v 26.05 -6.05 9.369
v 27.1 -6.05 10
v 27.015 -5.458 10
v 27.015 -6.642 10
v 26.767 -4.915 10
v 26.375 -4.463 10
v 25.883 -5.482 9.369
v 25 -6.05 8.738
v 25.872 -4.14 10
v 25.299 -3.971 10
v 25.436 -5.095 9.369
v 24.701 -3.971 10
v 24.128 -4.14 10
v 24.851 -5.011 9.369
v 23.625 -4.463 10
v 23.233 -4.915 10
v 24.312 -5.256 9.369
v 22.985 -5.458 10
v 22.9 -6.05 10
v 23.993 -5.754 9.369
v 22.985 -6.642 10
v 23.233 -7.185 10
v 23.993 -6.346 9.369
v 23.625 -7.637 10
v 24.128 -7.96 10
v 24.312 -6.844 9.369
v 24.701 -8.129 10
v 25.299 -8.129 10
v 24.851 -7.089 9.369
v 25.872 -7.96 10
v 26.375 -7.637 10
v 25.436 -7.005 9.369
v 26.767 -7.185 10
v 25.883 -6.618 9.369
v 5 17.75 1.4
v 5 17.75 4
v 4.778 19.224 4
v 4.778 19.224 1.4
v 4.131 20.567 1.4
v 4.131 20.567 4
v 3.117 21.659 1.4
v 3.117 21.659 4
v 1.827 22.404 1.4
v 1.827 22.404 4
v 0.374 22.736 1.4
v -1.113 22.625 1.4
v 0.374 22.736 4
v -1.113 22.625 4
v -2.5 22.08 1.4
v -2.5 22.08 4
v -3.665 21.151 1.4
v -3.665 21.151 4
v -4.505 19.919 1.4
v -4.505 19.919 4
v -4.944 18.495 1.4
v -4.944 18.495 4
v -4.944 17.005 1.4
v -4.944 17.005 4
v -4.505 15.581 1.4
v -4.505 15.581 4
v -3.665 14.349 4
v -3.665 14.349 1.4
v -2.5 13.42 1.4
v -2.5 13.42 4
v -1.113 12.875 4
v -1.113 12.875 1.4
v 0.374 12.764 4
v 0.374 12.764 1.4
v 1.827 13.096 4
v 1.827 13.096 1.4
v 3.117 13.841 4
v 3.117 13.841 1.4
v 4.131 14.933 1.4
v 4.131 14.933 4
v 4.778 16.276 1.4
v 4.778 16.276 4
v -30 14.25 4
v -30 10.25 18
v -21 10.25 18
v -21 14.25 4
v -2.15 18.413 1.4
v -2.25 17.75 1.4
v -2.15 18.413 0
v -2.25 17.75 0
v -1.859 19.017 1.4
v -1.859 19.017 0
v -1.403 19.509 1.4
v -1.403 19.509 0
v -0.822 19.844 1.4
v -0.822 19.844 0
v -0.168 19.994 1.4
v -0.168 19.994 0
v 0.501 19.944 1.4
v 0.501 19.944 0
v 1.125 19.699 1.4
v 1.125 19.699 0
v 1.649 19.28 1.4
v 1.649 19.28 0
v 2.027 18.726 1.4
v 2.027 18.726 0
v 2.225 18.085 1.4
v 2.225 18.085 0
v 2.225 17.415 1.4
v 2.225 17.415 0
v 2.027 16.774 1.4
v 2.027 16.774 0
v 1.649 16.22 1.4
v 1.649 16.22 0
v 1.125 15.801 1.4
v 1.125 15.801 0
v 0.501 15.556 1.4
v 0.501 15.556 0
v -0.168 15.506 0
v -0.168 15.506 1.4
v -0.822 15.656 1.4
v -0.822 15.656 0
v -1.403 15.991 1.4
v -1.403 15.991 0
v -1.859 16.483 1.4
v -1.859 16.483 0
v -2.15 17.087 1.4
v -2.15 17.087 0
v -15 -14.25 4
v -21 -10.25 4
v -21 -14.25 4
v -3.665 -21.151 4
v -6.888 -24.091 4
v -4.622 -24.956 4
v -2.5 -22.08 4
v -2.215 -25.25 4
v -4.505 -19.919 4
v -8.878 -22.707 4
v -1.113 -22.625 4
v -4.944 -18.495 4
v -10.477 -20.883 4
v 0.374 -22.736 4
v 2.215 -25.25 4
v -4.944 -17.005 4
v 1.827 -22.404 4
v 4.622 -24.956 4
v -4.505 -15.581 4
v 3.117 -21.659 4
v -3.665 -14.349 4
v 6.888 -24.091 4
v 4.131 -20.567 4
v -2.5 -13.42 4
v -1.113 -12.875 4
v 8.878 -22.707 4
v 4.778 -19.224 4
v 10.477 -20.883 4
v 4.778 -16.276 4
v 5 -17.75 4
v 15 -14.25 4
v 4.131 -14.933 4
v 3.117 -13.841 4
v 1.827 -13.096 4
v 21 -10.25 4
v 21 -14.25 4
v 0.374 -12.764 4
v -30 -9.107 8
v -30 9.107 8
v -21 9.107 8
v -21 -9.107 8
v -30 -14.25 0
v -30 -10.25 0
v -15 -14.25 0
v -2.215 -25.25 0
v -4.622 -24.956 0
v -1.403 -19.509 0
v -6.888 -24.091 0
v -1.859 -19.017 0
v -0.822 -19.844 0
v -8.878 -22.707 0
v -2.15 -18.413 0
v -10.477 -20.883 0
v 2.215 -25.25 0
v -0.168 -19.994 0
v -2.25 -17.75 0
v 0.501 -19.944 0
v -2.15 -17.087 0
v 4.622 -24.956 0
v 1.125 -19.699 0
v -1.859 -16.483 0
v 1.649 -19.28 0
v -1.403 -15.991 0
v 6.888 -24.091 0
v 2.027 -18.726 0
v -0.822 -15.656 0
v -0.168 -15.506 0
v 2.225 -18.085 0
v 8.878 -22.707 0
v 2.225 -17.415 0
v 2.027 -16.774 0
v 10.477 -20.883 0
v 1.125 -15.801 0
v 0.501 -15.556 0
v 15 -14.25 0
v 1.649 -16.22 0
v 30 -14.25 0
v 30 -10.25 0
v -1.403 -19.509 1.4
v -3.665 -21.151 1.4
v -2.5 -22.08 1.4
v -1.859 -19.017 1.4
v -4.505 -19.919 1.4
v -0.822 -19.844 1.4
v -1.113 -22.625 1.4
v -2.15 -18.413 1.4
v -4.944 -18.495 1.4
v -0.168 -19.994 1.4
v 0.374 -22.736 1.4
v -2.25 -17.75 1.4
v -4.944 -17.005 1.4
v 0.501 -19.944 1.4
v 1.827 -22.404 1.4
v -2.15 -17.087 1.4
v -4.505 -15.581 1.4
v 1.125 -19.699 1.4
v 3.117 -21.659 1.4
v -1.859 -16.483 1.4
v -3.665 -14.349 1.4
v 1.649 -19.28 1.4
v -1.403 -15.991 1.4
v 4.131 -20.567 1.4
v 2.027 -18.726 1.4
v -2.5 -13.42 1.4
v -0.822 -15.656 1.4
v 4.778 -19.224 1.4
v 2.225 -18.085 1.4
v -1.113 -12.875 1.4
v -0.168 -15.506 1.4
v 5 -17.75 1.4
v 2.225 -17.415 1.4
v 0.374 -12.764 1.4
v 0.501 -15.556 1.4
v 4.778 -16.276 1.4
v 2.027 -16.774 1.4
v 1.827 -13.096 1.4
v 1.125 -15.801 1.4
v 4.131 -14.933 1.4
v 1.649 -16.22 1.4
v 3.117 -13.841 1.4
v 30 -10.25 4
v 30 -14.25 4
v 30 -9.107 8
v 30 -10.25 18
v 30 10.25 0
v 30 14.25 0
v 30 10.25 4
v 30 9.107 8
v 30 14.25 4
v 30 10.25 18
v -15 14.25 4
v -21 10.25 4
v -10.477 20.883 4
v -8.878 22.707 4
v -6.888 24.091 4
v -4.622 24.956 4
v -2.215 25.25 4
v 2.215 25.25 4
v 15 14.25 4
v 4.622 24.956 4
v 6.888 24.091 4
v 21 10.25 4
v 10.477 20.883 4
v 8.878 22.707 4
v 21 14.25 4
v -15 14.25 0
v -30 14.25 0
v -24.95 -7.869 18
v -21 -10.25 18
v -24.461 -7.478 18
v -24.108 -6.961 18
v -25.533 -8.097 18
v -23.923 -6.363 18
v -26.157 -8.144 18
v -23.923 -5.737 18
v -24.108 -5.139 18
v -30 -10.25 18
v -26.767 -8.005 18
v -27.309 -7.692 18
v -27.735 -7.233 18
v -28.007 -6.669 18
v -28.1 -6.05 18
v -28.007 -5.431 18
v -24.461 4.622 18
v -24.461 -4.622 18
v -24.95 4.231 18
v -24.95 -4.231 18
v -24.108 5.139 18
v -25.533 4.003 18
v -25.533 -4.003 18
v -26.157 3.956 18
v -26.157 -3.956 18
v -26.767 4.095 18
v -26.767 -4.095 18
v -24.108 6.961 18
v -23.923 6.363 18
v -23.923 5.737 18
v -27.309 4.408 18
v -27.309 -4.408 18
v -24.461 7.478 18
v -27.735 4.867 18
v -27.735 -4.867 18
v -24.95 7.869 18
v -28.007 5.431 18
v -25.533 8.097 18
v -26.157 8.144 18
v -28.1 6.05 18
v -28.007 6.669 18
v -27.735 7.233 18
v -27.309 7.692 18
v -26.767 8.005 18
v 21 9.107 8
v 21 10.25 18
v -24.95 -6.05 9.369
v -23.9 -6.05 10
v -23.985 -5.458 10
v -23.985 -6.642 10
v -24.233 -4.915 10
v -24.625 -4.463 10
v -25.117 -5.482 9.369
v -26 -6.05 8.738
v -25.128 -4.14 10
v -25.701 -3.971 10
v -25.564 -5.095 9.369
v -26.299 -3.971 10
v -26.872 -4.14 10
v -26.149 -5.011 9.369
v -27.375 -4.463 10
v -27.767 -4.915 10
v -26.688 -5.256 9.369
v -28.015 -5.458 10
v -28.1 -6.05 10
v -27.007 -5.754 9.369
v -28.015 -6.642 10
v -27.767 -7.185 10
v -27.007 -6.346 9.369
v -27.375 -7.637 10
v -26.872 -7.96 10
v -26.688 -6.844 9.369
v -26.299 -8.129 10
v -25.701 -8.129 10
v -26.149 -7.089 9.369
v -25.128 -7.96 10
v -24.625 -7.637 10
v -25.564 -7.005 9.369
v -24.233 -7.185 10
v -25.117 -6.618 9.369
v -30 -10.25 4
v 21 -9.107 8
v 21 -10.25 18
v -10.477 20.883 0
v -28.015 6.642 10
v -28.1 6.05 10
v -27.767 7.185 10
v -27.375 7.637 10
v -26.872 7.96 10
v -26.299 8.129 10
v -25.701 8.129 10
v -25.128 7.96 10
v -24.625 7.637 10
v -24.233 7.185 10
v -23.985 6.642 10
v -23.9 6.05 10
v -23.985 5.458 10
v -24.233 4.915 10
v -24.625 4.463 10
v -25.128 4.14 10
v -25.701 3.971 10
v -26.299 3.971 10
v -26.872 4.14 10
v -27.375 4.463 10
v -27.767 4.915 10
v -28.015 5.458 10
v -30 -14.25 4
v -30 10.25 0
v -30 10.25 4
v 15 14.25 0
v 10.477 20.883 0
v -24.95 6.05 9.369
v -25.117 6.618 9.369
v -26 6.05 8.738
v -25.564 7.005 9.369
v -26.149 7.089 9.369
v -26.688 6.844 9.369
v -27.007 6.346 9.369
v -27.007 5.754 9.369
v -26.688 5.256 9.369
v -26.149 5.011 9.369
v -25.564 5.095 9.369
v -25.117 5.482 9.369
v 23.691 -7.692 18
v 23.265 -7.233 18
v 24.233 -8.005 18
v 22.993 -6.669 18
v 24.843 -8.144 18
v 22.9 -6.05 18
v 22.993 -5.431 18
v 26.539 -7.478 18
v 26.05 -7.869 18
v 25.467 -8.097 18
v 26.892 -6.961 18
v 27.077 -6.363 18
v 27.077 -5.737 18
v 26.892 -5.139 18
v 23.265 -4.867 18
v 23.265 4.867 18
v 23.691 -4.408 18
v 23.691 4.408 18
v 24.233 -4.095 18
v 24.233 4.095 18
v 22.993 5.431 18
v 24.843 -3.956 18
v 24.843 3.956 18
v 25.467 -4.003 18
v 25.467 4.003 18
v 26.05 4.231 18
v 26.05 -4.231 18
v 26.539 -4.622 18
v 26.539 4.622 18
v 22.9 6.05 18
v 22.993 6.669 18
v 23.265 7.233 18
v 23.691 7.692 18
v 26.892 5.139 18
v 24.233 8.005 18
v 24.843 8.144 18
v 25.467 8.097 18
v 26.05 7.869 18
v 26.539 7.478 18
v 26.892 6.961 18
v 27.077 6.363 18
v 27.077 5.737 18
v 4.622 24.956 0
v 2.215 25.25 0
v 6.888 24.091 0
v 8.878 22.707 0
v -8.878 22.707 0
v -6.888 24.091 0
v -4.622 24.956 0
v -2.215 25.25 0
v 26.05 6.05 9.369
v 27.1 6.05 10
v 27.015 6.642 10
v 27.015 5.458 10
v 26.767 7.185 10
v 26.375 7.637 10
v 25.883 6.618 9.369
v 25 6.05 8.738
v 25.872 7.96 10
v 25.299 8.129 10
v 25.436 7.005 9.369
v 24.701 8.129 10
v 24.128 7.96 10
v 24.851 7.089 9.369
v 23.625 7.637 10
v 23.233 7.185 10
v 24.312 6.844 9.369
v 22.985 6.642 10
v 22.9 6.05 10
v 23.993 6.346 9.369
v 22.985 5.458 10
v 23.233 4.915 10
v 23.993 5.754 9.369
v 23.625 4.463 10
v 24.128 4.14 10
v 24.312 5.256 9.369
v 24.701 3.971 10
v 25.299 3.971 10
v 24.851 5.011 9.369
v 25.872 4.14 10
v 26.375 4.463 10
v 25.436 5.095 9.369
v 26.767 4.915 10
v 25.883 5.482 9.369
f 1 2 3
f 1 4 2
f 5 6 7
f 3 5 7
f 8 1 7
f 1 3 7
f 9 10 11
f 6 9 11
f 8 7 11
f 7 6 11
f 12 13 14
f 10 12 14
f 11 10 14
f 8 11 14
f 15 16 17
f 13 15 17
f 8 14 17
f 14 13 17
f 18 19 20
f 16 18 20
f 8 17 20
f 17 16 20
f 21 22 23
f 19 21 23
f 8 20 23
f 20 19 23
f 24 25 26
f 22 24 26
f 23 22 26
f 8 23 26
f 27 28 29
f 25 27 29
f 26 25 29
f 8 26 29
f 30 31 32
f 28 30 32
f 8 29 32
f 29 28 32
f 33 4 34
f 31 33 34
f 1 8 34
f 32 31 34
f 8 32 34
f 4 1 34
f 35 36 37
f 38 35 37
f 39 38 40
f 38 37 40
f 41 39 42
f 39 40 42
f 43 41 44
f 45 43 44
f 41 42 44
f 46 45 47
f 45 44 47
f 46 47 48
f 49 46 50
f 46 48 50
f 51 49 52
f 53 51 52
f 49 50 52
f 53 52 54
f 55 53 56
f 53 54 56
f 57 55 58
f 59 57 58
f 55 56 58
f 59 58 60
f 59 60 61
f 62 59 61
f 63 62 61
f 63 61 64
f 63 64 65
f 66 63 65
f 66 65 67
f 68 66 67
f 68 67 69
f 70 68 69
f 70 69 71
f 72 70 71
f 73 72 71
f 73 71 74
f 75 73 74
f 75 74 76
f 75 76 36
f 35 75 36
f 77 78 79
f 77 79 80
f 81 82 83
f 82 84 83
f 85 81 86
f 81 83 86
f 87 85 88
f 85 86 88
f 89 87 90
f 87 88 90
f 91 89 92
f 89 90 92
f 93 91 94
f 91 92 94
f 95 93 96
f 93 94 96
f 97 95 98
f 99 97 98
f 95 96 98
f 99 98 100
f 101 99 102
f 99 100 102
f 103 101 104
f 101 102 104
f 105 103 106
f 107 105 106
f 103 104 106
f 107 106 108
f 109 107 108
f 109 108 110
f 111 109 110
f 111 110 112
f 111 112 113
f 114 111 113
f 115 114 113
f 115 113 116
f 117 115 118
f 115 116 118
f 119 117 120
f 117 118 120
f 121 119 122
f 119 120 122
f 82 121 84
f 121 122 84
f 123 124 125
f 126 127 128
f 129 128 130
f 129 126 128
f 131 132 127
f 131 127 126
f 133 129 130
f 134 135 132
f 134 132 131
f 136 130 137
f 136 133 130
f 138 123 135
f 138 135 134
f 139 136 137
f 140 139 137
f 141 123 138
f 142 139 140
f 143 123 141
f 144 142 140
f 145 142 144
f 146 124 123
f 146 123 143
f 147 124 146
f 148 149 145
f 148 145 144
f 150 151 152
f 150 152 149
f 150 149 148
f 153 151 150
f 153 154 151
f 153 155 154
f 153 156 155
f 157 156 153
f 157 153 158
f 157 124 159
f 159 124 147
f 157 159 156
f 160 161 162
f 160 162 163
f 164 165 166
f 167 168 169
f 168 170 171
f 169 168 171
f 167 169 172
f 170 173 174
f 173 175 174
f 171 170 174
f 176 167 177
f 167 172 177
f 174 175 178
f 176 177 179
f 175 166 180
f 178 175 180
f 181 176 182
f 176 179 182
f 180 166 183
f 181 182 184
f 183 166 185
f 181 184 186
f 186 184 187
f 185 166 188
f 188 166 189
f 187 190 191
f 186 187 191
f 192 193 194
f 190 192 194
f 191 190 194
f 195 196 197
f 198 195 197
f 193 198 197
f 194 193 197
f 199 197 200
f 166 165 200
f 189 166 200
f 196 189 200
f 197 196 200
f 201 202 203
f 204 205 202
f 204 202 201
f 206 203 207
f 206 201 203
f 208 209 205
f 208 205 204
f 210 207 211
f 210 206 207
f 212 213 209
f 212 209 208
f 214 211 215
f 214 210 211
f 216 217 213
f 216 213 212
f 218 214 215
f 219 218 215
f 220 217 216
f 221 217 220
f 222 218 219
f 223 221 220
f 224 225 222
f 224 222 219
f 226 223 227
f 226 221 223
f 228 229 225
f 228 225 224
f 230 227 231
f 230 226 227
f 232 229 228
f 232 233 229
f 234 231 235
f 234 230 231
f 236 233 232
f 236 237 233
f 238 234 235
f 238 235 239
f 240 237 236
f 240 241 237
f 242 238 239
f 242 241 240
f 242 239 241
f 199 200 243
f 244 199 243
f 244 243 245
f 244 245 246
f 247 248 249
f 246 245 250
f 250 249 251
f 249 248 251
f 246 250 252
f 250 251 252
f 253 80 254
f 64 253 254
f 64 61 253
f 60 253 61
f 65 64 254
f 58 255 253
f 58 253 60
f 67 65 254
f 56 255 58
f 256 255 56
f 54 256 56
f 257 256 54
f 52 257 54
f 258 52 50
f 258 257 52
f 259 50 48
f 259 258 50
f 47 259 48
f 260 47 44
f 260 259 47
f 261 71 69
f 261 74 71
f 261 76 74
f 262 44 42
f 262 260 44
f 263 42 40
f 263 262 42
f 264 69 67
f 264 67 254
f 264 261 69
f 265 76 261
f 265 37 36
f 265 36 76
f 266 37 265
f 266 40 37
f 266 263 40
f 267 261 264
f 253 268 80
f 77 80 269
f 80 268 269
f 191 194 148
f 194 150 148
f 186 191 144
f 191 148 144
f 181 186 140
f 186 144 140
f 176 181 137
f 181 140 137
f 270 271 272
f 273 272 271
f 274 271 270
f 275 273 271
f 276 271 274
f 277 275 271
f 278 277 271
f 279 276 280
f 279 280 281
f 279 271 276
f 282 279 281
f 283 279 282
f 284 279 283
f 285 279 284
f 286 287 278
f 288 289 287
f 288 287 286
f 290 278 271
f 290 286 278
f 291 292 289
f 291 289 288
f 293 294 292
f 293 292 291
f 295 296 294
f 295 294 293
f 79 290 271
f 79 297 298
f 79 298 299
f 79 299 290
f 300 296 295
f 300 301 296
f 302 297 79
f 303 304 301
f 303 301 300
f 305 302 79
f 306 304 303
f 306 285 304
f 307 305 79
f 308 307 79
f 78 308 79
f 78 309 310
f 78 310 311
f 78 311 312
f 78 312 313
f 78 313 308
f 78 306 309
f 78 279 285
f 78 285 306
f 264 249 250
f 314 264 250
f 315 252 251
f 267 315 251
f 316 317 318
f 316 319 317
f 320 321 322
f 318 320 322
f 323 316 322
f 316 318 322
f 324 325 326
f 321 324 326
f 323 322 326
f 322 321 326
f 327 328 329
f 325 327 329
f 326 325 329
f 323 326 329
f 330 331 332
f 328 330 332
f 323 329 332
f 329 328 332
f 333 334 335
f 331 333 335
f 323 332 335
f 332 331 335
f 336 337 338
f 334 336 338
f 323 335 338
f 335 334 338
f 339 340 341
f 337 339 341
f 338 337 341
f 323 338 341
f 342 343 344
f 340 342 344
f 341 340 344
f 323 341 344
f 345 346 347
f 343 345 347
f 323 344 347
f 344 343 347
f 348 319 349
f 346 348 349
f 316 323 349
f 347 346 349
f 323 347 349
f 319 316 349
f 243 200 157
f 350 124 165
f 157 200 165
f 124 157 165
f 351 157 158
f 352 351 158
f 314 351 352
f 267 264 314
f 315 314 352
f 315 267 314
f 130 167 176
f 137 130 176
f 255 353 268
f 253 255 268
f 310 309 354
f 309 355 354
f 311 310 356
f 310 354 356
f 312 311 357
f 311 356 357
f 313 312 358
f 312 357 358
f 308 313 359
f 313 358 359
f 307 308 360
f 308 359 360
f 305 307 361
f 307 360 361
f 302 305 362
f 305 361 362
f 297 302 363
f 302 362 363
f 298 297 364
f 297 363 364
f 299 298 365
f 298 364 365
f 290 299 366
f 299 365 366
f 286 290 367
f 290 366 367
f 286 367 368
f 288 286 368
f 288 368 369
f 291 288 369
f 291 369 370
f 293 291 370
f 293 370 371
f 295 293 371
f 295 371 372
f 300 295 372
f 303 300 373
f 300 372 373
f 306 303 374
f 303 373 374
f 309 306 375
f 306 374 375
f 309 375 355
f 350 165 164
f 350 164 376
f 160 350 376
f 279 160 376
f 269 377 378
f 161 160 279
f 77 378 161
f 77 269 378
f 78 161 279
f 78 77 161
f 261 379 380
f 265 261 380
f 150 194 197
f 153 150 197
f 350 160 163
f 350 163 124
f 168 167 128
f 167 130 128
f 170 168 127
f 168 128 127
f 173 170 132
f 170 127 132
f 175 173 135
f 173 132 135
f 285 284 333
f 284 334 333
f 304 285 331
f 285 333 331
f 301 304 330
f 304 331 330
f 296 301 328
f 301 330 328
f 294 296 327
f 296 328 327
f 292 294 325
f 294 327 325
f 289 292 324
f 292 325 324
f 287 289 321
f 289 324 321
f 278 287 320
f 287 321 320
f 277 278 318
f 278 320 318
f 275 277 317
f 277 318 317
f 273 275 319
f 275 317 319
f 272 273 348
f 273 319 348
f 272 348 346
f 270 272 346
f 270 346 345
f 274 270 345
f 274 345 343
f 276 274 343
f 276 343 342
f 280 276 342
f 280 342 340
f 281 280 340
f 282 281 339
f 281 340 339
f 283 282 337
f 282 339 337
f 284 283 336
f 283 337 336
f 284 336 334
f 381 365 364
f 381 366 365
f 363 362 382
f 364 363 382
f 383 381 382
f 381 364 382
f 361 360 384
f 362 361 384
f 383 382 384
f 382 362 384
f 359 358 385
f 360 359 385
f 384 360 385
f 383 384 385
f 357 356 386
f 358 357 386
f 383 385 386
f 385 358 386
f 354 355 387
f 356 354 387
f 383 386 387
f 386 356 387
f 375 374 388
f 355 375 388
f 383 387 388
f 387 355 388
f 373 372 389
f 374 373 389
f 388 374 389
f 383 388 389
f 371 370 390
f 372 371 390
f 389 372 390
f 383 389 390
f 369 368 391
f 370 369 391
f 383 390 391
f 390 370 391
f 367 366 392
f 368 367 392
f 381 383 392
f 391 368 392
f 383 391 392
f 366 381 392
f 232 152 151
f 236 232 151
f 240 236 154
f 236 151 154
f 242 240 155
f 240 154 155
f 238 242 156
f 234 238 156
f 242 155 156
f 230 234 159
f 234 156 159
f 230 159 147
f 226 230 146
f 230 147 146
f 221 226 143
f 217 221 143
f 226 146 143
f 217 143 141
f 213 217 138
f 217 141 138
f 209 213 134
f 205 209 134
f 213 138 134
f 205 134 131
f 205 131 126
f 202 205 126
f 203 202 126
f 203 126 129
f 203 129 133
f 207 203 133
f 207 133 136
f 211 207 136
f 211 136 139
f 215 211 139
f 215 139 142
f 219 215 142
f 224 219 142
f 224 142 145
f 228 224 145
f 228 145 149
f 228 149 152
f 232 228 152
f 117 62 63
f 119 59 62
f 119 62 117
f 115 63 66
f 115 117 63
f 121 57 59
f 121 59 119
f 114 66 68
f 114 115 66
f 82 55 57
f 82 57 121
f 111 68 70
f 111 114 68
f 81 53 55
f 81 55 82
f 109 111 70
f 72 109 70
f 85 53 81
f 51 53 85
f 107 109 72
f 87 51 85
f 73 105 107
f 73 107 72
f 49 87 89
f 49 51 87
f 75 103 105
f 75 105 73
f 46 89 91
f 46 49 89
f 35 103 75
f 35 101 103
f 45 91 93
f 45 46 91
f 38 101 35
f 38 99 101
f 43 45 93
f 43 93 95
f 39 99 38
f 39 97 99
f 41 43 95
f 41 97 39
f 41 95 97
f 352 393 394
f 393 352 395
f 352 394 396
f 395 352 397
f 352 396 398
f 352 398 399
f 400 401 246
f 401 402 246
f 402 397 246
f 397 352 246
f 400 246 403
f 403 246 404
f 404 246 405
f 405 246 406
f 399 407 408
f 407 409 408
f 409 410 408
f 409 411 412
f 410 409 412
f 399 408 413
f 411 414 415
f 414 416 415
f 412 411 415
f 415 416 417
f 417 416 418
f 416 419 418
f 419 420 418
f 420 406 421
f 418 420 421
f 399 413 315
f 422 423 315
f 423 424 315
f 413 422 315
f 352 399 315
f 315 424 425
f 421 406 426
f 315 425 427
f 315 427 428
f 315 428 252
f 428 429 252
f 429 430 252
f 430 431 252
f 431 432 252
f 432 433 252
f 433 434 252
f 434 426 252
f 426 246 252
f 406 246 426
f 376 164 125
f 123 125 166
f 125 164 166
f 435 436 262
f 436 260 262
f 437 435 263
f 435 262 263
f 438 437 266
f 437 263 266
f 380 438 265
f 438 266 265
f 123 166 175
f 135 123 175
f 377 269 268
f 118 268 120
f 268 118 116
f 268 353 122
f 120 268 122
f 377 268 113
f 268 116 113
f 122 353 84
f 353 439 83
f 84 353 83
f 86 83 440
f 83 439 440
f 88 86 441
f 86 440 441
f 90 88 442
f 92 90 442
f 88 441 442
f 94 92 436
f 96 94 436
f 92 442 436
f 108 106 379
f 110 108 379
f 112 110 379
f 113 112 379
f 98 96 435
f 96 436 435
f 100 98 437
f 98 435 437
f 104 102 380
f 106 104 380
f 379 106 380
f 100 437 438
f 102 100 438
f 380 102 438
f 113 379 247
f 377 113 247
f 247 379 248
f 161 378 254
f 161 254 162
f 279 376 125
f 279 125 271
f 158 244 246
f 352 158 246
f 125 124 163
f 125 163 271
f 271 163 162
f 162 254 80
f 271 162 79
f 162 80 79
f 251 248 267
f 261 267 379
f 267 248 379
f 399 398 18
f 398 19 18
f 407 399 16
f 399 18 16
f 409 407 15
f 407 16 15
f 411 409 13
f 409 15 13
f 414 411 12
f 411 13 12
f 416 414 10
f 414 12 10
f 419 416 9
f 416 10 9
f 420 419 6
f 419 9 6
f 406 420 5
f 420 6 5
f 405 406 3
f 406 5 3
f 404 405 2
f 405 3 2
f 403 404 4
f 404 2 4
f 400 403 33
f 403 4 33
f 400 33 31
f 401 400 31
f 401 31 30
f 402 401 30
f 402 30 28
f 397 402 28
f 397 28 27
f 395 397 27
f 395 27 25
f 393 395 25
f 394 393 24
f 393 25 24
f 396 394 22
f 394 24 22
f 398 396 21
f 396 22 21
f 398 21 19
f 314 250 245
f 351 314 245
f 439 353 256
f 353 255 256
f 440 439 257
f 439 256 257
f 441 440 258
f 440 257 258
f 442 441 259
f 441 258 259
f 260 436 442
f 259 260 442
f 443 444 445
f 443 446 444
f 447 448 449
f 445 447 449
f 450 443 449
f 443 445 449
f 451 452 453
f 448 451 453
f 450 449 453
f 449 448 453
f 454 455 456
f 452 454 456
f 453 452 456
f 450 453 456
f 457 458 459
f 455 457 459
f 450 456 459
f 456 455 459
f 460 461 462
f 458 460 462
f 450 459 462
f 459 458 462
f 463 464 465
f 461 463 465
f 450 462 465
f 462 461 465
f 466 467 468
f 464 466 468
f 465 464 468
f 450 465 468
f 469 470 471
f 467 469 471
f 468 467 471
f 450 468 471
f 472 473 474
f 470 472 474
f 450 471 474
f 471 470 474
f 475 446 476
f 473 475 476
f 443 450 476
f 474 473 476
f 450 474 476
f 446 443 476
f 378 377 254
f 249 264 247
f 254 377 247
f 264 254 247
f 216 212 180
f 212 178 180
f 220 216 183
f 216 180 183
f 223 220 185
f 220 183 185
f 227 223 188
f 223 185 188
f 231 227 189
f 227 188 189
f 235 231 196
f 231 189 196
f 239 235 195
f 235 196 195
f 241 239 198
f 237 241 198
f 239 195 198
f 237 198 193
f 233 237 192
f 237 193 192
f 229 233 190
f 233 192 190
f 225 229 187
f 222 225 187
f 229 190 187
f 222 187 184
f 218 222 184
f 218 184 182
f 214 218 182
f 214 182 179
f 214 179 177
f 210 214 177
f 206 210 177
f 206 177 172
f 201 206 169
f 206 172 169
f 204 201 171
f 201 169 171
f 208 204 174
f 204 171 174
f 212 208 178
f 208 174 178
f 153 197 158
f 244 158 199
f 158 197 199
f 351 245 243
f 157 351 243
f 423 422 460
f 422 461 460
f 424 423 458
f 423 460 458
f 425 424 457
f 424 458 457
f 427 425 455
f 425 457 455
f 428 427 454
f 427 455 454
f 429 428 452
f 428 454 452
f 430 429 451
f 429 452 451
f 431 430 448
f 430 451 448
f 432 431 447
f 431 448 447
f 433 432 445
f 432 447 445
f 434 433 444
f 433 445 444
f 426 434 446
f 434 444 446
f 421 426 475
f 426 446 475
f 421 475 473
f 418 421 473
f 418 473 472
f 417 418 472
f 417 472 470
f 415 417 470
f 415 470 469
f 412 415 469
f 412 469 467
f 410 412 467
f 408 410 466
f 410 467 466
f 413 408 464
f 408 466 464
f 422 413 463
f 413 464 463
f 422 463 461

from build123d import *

# Parameters (mm, degrees)
ESTRUSIONE_ESTRUSIONE1_DEPTH                         = 4
ESTRUSIONE_ESTRUSIONE1_2_DEPTH                       = 4
ESTRUSIONE_ESTRUSIONE2_DEPTH                         = 9
ESTRUSIONE_ESTRUSIONE3_DEPTH                         = 9
RACCORDO1_R                                          = 10
FORO_LAMATO_PER_VITE_M4_A_TESTA_CILINDRI_D           = 4.5
FORO_LAMATO_PER_VITE_M4_A_TESTA_CILINDRI_DEPTH       = 34
FORO_LAMATO_PER_VITE_M4_A_TESTA_CILINDRI_CBORE_D     = 10
FORO_LAMATO_PER_VITE_M4_A_TESTA_CILINDRI_CBORE_DEPTH = 2.6
FORO_LAMATO_PER_VITE_M4_A_TESTA_CILINDRI_TIP         = 1.351936393
FORO_PER_VITE_M4_1_D                                 = 4.2
FORO_PER_VITE_M4_1_DEPTH                             = 8
FORO_PER_VITE_M4_1_TIP                               = 1.2618073


with BuildPart() as part:
    # Schizzo3 → Estrusione-Estrusione1 (new body)
    with BuildSketch(Plane.XY):
        Polygon((-30, 10.25), (30, 10.25), (30, 14.25), (15, 14.25), (7.5, 25.25), (-7.5, 25.25), (-15, 14.25), (-30, 14.25), align=None)
    extrude(amount=ESTRUSIONE_ESTRUSIONE1_DEPTH)



with BuildPart() as body_2:
    # Schizzo3 → Estrusione-Estrusione1 2 (new body)
    with BuildSketch(Plane.XY):
        Polygon((30, -10.25), (-30, -10.25), (-30, -14.25), (-15, -14.25), (-7.5, -25.25), (7.5, -25.25), (15, -14.25), (30, -14.25), align=None)
    extrude(amount=ESTRUSIONE_ESTRUSIONE1_2_DEPTH)


with BuildPart() as part_1:
    add(part.part)

    add(body_2.part)  # Estrusione-Estrusione2 merges body 2
    # Schizzo4 → Estrusione-Estrusione2 (add)
    with BuildSketch(Plane.ZY.offset(30)):
        Polygon((18, 10.25), (4, 14.25), (4, 10.25), (8, 9.107142857), (8, -9.107142857), (4, -10.25), (4, -14.25), (18, -10.25), align=None)
    extrude(amount=-ESTRUSIONE_ESTRUSIONE2_DEPTH)

    # Schizzo5 → Estrusione-Estrusione3 (add)
    with BuildSketch(Plane(origin=(30, 0, 0), x_dir=(0, 0, -1), z_dir=(1, 0, 0))):
        Polygon((-4, -14.25), (-18, -10.25), (-18, 10.25), (-4, 14.25), (-4, 10.25), (-8, 9.107142857), (-8, -9.107142857), (-4, -10.25), align=None)
    extrude(amount=-ESTRUSIONE_ESTRUSIONE3_DEPTH)

    # Raccordo1
    raccordo1_edges = [part_1.edges().sort_by_distance(p)[0] for p in [
        (-7.5, 25.25, 2),
        (7.5, 25.25, 2),
        (-7.5, -25.25, 2),
        (7.5, -25.25, 2),
    ]]
    fillet(raccordo1_edges, radius=RACCORDO1_R)

    # Foro lamato per Vite M4 a testa cilindrica piana-1
    with Locations(Plane.XY.offset(4)):
        with Locations((0, 17.75), (0, -17.75)):
            CounterBoreHole(FORO_LAMATO_PER_VITE_M4_A_TESTA_CILINDRI_D / 2, FORO_LAMATO_PER_VITE_M4_A_TESTA_CILINDRI_CBORE_D / 2, FORO_LAMATO_PER_VITE_M4_A_TESTA_CILINDRI_CBORE_DEPTH, depth=FORO_LAMATO_PER_VITE_M4_A_TESTA_CILINDRI_DEPTH)
            with Locations((0, 0, -(FORO_LAMATO_PER_VITE_M4_A_TESTA_CILINDRI_DEPTH + FORO_LAMATO_PER_VITE_M4_A_TESTA_CILINDRI_TIP / 2))):  # 118° drill point
                Cone(0, FORO_LAMATO_PER_VITE_M4_A_TESTA_CILINDRI_D / 2, FORO_LAMATO_PER_VITE_M4_A_TESTA_CILINDRI_TIP, mode=Mode.SUBTRACT)

    # Foro per Vite M4-1
    with Locations(Plane.XY.offset(18)):
        with Locations((-26, -6.05), (25, 6.05), (25, -6.05), (-26, 6.05)):
            Hole(FORO_PER_VITE_M4_1_D / 2, depth=FORO_PER_VITE_M4_1_DEPTH)
            with Locations((0, 0, -(FORO_PER_VITE_M4_1_DEPTH + FORO_PER_VITE_M4_1_TIP / 2))):  # 118° drill point
                Cone(0, FORO_PER_VITE_M4_1_D / 2, FORO_PER_VITE_M4_1_TIP, mode=Mode.SUBTRACT)


solid = part_1.part
